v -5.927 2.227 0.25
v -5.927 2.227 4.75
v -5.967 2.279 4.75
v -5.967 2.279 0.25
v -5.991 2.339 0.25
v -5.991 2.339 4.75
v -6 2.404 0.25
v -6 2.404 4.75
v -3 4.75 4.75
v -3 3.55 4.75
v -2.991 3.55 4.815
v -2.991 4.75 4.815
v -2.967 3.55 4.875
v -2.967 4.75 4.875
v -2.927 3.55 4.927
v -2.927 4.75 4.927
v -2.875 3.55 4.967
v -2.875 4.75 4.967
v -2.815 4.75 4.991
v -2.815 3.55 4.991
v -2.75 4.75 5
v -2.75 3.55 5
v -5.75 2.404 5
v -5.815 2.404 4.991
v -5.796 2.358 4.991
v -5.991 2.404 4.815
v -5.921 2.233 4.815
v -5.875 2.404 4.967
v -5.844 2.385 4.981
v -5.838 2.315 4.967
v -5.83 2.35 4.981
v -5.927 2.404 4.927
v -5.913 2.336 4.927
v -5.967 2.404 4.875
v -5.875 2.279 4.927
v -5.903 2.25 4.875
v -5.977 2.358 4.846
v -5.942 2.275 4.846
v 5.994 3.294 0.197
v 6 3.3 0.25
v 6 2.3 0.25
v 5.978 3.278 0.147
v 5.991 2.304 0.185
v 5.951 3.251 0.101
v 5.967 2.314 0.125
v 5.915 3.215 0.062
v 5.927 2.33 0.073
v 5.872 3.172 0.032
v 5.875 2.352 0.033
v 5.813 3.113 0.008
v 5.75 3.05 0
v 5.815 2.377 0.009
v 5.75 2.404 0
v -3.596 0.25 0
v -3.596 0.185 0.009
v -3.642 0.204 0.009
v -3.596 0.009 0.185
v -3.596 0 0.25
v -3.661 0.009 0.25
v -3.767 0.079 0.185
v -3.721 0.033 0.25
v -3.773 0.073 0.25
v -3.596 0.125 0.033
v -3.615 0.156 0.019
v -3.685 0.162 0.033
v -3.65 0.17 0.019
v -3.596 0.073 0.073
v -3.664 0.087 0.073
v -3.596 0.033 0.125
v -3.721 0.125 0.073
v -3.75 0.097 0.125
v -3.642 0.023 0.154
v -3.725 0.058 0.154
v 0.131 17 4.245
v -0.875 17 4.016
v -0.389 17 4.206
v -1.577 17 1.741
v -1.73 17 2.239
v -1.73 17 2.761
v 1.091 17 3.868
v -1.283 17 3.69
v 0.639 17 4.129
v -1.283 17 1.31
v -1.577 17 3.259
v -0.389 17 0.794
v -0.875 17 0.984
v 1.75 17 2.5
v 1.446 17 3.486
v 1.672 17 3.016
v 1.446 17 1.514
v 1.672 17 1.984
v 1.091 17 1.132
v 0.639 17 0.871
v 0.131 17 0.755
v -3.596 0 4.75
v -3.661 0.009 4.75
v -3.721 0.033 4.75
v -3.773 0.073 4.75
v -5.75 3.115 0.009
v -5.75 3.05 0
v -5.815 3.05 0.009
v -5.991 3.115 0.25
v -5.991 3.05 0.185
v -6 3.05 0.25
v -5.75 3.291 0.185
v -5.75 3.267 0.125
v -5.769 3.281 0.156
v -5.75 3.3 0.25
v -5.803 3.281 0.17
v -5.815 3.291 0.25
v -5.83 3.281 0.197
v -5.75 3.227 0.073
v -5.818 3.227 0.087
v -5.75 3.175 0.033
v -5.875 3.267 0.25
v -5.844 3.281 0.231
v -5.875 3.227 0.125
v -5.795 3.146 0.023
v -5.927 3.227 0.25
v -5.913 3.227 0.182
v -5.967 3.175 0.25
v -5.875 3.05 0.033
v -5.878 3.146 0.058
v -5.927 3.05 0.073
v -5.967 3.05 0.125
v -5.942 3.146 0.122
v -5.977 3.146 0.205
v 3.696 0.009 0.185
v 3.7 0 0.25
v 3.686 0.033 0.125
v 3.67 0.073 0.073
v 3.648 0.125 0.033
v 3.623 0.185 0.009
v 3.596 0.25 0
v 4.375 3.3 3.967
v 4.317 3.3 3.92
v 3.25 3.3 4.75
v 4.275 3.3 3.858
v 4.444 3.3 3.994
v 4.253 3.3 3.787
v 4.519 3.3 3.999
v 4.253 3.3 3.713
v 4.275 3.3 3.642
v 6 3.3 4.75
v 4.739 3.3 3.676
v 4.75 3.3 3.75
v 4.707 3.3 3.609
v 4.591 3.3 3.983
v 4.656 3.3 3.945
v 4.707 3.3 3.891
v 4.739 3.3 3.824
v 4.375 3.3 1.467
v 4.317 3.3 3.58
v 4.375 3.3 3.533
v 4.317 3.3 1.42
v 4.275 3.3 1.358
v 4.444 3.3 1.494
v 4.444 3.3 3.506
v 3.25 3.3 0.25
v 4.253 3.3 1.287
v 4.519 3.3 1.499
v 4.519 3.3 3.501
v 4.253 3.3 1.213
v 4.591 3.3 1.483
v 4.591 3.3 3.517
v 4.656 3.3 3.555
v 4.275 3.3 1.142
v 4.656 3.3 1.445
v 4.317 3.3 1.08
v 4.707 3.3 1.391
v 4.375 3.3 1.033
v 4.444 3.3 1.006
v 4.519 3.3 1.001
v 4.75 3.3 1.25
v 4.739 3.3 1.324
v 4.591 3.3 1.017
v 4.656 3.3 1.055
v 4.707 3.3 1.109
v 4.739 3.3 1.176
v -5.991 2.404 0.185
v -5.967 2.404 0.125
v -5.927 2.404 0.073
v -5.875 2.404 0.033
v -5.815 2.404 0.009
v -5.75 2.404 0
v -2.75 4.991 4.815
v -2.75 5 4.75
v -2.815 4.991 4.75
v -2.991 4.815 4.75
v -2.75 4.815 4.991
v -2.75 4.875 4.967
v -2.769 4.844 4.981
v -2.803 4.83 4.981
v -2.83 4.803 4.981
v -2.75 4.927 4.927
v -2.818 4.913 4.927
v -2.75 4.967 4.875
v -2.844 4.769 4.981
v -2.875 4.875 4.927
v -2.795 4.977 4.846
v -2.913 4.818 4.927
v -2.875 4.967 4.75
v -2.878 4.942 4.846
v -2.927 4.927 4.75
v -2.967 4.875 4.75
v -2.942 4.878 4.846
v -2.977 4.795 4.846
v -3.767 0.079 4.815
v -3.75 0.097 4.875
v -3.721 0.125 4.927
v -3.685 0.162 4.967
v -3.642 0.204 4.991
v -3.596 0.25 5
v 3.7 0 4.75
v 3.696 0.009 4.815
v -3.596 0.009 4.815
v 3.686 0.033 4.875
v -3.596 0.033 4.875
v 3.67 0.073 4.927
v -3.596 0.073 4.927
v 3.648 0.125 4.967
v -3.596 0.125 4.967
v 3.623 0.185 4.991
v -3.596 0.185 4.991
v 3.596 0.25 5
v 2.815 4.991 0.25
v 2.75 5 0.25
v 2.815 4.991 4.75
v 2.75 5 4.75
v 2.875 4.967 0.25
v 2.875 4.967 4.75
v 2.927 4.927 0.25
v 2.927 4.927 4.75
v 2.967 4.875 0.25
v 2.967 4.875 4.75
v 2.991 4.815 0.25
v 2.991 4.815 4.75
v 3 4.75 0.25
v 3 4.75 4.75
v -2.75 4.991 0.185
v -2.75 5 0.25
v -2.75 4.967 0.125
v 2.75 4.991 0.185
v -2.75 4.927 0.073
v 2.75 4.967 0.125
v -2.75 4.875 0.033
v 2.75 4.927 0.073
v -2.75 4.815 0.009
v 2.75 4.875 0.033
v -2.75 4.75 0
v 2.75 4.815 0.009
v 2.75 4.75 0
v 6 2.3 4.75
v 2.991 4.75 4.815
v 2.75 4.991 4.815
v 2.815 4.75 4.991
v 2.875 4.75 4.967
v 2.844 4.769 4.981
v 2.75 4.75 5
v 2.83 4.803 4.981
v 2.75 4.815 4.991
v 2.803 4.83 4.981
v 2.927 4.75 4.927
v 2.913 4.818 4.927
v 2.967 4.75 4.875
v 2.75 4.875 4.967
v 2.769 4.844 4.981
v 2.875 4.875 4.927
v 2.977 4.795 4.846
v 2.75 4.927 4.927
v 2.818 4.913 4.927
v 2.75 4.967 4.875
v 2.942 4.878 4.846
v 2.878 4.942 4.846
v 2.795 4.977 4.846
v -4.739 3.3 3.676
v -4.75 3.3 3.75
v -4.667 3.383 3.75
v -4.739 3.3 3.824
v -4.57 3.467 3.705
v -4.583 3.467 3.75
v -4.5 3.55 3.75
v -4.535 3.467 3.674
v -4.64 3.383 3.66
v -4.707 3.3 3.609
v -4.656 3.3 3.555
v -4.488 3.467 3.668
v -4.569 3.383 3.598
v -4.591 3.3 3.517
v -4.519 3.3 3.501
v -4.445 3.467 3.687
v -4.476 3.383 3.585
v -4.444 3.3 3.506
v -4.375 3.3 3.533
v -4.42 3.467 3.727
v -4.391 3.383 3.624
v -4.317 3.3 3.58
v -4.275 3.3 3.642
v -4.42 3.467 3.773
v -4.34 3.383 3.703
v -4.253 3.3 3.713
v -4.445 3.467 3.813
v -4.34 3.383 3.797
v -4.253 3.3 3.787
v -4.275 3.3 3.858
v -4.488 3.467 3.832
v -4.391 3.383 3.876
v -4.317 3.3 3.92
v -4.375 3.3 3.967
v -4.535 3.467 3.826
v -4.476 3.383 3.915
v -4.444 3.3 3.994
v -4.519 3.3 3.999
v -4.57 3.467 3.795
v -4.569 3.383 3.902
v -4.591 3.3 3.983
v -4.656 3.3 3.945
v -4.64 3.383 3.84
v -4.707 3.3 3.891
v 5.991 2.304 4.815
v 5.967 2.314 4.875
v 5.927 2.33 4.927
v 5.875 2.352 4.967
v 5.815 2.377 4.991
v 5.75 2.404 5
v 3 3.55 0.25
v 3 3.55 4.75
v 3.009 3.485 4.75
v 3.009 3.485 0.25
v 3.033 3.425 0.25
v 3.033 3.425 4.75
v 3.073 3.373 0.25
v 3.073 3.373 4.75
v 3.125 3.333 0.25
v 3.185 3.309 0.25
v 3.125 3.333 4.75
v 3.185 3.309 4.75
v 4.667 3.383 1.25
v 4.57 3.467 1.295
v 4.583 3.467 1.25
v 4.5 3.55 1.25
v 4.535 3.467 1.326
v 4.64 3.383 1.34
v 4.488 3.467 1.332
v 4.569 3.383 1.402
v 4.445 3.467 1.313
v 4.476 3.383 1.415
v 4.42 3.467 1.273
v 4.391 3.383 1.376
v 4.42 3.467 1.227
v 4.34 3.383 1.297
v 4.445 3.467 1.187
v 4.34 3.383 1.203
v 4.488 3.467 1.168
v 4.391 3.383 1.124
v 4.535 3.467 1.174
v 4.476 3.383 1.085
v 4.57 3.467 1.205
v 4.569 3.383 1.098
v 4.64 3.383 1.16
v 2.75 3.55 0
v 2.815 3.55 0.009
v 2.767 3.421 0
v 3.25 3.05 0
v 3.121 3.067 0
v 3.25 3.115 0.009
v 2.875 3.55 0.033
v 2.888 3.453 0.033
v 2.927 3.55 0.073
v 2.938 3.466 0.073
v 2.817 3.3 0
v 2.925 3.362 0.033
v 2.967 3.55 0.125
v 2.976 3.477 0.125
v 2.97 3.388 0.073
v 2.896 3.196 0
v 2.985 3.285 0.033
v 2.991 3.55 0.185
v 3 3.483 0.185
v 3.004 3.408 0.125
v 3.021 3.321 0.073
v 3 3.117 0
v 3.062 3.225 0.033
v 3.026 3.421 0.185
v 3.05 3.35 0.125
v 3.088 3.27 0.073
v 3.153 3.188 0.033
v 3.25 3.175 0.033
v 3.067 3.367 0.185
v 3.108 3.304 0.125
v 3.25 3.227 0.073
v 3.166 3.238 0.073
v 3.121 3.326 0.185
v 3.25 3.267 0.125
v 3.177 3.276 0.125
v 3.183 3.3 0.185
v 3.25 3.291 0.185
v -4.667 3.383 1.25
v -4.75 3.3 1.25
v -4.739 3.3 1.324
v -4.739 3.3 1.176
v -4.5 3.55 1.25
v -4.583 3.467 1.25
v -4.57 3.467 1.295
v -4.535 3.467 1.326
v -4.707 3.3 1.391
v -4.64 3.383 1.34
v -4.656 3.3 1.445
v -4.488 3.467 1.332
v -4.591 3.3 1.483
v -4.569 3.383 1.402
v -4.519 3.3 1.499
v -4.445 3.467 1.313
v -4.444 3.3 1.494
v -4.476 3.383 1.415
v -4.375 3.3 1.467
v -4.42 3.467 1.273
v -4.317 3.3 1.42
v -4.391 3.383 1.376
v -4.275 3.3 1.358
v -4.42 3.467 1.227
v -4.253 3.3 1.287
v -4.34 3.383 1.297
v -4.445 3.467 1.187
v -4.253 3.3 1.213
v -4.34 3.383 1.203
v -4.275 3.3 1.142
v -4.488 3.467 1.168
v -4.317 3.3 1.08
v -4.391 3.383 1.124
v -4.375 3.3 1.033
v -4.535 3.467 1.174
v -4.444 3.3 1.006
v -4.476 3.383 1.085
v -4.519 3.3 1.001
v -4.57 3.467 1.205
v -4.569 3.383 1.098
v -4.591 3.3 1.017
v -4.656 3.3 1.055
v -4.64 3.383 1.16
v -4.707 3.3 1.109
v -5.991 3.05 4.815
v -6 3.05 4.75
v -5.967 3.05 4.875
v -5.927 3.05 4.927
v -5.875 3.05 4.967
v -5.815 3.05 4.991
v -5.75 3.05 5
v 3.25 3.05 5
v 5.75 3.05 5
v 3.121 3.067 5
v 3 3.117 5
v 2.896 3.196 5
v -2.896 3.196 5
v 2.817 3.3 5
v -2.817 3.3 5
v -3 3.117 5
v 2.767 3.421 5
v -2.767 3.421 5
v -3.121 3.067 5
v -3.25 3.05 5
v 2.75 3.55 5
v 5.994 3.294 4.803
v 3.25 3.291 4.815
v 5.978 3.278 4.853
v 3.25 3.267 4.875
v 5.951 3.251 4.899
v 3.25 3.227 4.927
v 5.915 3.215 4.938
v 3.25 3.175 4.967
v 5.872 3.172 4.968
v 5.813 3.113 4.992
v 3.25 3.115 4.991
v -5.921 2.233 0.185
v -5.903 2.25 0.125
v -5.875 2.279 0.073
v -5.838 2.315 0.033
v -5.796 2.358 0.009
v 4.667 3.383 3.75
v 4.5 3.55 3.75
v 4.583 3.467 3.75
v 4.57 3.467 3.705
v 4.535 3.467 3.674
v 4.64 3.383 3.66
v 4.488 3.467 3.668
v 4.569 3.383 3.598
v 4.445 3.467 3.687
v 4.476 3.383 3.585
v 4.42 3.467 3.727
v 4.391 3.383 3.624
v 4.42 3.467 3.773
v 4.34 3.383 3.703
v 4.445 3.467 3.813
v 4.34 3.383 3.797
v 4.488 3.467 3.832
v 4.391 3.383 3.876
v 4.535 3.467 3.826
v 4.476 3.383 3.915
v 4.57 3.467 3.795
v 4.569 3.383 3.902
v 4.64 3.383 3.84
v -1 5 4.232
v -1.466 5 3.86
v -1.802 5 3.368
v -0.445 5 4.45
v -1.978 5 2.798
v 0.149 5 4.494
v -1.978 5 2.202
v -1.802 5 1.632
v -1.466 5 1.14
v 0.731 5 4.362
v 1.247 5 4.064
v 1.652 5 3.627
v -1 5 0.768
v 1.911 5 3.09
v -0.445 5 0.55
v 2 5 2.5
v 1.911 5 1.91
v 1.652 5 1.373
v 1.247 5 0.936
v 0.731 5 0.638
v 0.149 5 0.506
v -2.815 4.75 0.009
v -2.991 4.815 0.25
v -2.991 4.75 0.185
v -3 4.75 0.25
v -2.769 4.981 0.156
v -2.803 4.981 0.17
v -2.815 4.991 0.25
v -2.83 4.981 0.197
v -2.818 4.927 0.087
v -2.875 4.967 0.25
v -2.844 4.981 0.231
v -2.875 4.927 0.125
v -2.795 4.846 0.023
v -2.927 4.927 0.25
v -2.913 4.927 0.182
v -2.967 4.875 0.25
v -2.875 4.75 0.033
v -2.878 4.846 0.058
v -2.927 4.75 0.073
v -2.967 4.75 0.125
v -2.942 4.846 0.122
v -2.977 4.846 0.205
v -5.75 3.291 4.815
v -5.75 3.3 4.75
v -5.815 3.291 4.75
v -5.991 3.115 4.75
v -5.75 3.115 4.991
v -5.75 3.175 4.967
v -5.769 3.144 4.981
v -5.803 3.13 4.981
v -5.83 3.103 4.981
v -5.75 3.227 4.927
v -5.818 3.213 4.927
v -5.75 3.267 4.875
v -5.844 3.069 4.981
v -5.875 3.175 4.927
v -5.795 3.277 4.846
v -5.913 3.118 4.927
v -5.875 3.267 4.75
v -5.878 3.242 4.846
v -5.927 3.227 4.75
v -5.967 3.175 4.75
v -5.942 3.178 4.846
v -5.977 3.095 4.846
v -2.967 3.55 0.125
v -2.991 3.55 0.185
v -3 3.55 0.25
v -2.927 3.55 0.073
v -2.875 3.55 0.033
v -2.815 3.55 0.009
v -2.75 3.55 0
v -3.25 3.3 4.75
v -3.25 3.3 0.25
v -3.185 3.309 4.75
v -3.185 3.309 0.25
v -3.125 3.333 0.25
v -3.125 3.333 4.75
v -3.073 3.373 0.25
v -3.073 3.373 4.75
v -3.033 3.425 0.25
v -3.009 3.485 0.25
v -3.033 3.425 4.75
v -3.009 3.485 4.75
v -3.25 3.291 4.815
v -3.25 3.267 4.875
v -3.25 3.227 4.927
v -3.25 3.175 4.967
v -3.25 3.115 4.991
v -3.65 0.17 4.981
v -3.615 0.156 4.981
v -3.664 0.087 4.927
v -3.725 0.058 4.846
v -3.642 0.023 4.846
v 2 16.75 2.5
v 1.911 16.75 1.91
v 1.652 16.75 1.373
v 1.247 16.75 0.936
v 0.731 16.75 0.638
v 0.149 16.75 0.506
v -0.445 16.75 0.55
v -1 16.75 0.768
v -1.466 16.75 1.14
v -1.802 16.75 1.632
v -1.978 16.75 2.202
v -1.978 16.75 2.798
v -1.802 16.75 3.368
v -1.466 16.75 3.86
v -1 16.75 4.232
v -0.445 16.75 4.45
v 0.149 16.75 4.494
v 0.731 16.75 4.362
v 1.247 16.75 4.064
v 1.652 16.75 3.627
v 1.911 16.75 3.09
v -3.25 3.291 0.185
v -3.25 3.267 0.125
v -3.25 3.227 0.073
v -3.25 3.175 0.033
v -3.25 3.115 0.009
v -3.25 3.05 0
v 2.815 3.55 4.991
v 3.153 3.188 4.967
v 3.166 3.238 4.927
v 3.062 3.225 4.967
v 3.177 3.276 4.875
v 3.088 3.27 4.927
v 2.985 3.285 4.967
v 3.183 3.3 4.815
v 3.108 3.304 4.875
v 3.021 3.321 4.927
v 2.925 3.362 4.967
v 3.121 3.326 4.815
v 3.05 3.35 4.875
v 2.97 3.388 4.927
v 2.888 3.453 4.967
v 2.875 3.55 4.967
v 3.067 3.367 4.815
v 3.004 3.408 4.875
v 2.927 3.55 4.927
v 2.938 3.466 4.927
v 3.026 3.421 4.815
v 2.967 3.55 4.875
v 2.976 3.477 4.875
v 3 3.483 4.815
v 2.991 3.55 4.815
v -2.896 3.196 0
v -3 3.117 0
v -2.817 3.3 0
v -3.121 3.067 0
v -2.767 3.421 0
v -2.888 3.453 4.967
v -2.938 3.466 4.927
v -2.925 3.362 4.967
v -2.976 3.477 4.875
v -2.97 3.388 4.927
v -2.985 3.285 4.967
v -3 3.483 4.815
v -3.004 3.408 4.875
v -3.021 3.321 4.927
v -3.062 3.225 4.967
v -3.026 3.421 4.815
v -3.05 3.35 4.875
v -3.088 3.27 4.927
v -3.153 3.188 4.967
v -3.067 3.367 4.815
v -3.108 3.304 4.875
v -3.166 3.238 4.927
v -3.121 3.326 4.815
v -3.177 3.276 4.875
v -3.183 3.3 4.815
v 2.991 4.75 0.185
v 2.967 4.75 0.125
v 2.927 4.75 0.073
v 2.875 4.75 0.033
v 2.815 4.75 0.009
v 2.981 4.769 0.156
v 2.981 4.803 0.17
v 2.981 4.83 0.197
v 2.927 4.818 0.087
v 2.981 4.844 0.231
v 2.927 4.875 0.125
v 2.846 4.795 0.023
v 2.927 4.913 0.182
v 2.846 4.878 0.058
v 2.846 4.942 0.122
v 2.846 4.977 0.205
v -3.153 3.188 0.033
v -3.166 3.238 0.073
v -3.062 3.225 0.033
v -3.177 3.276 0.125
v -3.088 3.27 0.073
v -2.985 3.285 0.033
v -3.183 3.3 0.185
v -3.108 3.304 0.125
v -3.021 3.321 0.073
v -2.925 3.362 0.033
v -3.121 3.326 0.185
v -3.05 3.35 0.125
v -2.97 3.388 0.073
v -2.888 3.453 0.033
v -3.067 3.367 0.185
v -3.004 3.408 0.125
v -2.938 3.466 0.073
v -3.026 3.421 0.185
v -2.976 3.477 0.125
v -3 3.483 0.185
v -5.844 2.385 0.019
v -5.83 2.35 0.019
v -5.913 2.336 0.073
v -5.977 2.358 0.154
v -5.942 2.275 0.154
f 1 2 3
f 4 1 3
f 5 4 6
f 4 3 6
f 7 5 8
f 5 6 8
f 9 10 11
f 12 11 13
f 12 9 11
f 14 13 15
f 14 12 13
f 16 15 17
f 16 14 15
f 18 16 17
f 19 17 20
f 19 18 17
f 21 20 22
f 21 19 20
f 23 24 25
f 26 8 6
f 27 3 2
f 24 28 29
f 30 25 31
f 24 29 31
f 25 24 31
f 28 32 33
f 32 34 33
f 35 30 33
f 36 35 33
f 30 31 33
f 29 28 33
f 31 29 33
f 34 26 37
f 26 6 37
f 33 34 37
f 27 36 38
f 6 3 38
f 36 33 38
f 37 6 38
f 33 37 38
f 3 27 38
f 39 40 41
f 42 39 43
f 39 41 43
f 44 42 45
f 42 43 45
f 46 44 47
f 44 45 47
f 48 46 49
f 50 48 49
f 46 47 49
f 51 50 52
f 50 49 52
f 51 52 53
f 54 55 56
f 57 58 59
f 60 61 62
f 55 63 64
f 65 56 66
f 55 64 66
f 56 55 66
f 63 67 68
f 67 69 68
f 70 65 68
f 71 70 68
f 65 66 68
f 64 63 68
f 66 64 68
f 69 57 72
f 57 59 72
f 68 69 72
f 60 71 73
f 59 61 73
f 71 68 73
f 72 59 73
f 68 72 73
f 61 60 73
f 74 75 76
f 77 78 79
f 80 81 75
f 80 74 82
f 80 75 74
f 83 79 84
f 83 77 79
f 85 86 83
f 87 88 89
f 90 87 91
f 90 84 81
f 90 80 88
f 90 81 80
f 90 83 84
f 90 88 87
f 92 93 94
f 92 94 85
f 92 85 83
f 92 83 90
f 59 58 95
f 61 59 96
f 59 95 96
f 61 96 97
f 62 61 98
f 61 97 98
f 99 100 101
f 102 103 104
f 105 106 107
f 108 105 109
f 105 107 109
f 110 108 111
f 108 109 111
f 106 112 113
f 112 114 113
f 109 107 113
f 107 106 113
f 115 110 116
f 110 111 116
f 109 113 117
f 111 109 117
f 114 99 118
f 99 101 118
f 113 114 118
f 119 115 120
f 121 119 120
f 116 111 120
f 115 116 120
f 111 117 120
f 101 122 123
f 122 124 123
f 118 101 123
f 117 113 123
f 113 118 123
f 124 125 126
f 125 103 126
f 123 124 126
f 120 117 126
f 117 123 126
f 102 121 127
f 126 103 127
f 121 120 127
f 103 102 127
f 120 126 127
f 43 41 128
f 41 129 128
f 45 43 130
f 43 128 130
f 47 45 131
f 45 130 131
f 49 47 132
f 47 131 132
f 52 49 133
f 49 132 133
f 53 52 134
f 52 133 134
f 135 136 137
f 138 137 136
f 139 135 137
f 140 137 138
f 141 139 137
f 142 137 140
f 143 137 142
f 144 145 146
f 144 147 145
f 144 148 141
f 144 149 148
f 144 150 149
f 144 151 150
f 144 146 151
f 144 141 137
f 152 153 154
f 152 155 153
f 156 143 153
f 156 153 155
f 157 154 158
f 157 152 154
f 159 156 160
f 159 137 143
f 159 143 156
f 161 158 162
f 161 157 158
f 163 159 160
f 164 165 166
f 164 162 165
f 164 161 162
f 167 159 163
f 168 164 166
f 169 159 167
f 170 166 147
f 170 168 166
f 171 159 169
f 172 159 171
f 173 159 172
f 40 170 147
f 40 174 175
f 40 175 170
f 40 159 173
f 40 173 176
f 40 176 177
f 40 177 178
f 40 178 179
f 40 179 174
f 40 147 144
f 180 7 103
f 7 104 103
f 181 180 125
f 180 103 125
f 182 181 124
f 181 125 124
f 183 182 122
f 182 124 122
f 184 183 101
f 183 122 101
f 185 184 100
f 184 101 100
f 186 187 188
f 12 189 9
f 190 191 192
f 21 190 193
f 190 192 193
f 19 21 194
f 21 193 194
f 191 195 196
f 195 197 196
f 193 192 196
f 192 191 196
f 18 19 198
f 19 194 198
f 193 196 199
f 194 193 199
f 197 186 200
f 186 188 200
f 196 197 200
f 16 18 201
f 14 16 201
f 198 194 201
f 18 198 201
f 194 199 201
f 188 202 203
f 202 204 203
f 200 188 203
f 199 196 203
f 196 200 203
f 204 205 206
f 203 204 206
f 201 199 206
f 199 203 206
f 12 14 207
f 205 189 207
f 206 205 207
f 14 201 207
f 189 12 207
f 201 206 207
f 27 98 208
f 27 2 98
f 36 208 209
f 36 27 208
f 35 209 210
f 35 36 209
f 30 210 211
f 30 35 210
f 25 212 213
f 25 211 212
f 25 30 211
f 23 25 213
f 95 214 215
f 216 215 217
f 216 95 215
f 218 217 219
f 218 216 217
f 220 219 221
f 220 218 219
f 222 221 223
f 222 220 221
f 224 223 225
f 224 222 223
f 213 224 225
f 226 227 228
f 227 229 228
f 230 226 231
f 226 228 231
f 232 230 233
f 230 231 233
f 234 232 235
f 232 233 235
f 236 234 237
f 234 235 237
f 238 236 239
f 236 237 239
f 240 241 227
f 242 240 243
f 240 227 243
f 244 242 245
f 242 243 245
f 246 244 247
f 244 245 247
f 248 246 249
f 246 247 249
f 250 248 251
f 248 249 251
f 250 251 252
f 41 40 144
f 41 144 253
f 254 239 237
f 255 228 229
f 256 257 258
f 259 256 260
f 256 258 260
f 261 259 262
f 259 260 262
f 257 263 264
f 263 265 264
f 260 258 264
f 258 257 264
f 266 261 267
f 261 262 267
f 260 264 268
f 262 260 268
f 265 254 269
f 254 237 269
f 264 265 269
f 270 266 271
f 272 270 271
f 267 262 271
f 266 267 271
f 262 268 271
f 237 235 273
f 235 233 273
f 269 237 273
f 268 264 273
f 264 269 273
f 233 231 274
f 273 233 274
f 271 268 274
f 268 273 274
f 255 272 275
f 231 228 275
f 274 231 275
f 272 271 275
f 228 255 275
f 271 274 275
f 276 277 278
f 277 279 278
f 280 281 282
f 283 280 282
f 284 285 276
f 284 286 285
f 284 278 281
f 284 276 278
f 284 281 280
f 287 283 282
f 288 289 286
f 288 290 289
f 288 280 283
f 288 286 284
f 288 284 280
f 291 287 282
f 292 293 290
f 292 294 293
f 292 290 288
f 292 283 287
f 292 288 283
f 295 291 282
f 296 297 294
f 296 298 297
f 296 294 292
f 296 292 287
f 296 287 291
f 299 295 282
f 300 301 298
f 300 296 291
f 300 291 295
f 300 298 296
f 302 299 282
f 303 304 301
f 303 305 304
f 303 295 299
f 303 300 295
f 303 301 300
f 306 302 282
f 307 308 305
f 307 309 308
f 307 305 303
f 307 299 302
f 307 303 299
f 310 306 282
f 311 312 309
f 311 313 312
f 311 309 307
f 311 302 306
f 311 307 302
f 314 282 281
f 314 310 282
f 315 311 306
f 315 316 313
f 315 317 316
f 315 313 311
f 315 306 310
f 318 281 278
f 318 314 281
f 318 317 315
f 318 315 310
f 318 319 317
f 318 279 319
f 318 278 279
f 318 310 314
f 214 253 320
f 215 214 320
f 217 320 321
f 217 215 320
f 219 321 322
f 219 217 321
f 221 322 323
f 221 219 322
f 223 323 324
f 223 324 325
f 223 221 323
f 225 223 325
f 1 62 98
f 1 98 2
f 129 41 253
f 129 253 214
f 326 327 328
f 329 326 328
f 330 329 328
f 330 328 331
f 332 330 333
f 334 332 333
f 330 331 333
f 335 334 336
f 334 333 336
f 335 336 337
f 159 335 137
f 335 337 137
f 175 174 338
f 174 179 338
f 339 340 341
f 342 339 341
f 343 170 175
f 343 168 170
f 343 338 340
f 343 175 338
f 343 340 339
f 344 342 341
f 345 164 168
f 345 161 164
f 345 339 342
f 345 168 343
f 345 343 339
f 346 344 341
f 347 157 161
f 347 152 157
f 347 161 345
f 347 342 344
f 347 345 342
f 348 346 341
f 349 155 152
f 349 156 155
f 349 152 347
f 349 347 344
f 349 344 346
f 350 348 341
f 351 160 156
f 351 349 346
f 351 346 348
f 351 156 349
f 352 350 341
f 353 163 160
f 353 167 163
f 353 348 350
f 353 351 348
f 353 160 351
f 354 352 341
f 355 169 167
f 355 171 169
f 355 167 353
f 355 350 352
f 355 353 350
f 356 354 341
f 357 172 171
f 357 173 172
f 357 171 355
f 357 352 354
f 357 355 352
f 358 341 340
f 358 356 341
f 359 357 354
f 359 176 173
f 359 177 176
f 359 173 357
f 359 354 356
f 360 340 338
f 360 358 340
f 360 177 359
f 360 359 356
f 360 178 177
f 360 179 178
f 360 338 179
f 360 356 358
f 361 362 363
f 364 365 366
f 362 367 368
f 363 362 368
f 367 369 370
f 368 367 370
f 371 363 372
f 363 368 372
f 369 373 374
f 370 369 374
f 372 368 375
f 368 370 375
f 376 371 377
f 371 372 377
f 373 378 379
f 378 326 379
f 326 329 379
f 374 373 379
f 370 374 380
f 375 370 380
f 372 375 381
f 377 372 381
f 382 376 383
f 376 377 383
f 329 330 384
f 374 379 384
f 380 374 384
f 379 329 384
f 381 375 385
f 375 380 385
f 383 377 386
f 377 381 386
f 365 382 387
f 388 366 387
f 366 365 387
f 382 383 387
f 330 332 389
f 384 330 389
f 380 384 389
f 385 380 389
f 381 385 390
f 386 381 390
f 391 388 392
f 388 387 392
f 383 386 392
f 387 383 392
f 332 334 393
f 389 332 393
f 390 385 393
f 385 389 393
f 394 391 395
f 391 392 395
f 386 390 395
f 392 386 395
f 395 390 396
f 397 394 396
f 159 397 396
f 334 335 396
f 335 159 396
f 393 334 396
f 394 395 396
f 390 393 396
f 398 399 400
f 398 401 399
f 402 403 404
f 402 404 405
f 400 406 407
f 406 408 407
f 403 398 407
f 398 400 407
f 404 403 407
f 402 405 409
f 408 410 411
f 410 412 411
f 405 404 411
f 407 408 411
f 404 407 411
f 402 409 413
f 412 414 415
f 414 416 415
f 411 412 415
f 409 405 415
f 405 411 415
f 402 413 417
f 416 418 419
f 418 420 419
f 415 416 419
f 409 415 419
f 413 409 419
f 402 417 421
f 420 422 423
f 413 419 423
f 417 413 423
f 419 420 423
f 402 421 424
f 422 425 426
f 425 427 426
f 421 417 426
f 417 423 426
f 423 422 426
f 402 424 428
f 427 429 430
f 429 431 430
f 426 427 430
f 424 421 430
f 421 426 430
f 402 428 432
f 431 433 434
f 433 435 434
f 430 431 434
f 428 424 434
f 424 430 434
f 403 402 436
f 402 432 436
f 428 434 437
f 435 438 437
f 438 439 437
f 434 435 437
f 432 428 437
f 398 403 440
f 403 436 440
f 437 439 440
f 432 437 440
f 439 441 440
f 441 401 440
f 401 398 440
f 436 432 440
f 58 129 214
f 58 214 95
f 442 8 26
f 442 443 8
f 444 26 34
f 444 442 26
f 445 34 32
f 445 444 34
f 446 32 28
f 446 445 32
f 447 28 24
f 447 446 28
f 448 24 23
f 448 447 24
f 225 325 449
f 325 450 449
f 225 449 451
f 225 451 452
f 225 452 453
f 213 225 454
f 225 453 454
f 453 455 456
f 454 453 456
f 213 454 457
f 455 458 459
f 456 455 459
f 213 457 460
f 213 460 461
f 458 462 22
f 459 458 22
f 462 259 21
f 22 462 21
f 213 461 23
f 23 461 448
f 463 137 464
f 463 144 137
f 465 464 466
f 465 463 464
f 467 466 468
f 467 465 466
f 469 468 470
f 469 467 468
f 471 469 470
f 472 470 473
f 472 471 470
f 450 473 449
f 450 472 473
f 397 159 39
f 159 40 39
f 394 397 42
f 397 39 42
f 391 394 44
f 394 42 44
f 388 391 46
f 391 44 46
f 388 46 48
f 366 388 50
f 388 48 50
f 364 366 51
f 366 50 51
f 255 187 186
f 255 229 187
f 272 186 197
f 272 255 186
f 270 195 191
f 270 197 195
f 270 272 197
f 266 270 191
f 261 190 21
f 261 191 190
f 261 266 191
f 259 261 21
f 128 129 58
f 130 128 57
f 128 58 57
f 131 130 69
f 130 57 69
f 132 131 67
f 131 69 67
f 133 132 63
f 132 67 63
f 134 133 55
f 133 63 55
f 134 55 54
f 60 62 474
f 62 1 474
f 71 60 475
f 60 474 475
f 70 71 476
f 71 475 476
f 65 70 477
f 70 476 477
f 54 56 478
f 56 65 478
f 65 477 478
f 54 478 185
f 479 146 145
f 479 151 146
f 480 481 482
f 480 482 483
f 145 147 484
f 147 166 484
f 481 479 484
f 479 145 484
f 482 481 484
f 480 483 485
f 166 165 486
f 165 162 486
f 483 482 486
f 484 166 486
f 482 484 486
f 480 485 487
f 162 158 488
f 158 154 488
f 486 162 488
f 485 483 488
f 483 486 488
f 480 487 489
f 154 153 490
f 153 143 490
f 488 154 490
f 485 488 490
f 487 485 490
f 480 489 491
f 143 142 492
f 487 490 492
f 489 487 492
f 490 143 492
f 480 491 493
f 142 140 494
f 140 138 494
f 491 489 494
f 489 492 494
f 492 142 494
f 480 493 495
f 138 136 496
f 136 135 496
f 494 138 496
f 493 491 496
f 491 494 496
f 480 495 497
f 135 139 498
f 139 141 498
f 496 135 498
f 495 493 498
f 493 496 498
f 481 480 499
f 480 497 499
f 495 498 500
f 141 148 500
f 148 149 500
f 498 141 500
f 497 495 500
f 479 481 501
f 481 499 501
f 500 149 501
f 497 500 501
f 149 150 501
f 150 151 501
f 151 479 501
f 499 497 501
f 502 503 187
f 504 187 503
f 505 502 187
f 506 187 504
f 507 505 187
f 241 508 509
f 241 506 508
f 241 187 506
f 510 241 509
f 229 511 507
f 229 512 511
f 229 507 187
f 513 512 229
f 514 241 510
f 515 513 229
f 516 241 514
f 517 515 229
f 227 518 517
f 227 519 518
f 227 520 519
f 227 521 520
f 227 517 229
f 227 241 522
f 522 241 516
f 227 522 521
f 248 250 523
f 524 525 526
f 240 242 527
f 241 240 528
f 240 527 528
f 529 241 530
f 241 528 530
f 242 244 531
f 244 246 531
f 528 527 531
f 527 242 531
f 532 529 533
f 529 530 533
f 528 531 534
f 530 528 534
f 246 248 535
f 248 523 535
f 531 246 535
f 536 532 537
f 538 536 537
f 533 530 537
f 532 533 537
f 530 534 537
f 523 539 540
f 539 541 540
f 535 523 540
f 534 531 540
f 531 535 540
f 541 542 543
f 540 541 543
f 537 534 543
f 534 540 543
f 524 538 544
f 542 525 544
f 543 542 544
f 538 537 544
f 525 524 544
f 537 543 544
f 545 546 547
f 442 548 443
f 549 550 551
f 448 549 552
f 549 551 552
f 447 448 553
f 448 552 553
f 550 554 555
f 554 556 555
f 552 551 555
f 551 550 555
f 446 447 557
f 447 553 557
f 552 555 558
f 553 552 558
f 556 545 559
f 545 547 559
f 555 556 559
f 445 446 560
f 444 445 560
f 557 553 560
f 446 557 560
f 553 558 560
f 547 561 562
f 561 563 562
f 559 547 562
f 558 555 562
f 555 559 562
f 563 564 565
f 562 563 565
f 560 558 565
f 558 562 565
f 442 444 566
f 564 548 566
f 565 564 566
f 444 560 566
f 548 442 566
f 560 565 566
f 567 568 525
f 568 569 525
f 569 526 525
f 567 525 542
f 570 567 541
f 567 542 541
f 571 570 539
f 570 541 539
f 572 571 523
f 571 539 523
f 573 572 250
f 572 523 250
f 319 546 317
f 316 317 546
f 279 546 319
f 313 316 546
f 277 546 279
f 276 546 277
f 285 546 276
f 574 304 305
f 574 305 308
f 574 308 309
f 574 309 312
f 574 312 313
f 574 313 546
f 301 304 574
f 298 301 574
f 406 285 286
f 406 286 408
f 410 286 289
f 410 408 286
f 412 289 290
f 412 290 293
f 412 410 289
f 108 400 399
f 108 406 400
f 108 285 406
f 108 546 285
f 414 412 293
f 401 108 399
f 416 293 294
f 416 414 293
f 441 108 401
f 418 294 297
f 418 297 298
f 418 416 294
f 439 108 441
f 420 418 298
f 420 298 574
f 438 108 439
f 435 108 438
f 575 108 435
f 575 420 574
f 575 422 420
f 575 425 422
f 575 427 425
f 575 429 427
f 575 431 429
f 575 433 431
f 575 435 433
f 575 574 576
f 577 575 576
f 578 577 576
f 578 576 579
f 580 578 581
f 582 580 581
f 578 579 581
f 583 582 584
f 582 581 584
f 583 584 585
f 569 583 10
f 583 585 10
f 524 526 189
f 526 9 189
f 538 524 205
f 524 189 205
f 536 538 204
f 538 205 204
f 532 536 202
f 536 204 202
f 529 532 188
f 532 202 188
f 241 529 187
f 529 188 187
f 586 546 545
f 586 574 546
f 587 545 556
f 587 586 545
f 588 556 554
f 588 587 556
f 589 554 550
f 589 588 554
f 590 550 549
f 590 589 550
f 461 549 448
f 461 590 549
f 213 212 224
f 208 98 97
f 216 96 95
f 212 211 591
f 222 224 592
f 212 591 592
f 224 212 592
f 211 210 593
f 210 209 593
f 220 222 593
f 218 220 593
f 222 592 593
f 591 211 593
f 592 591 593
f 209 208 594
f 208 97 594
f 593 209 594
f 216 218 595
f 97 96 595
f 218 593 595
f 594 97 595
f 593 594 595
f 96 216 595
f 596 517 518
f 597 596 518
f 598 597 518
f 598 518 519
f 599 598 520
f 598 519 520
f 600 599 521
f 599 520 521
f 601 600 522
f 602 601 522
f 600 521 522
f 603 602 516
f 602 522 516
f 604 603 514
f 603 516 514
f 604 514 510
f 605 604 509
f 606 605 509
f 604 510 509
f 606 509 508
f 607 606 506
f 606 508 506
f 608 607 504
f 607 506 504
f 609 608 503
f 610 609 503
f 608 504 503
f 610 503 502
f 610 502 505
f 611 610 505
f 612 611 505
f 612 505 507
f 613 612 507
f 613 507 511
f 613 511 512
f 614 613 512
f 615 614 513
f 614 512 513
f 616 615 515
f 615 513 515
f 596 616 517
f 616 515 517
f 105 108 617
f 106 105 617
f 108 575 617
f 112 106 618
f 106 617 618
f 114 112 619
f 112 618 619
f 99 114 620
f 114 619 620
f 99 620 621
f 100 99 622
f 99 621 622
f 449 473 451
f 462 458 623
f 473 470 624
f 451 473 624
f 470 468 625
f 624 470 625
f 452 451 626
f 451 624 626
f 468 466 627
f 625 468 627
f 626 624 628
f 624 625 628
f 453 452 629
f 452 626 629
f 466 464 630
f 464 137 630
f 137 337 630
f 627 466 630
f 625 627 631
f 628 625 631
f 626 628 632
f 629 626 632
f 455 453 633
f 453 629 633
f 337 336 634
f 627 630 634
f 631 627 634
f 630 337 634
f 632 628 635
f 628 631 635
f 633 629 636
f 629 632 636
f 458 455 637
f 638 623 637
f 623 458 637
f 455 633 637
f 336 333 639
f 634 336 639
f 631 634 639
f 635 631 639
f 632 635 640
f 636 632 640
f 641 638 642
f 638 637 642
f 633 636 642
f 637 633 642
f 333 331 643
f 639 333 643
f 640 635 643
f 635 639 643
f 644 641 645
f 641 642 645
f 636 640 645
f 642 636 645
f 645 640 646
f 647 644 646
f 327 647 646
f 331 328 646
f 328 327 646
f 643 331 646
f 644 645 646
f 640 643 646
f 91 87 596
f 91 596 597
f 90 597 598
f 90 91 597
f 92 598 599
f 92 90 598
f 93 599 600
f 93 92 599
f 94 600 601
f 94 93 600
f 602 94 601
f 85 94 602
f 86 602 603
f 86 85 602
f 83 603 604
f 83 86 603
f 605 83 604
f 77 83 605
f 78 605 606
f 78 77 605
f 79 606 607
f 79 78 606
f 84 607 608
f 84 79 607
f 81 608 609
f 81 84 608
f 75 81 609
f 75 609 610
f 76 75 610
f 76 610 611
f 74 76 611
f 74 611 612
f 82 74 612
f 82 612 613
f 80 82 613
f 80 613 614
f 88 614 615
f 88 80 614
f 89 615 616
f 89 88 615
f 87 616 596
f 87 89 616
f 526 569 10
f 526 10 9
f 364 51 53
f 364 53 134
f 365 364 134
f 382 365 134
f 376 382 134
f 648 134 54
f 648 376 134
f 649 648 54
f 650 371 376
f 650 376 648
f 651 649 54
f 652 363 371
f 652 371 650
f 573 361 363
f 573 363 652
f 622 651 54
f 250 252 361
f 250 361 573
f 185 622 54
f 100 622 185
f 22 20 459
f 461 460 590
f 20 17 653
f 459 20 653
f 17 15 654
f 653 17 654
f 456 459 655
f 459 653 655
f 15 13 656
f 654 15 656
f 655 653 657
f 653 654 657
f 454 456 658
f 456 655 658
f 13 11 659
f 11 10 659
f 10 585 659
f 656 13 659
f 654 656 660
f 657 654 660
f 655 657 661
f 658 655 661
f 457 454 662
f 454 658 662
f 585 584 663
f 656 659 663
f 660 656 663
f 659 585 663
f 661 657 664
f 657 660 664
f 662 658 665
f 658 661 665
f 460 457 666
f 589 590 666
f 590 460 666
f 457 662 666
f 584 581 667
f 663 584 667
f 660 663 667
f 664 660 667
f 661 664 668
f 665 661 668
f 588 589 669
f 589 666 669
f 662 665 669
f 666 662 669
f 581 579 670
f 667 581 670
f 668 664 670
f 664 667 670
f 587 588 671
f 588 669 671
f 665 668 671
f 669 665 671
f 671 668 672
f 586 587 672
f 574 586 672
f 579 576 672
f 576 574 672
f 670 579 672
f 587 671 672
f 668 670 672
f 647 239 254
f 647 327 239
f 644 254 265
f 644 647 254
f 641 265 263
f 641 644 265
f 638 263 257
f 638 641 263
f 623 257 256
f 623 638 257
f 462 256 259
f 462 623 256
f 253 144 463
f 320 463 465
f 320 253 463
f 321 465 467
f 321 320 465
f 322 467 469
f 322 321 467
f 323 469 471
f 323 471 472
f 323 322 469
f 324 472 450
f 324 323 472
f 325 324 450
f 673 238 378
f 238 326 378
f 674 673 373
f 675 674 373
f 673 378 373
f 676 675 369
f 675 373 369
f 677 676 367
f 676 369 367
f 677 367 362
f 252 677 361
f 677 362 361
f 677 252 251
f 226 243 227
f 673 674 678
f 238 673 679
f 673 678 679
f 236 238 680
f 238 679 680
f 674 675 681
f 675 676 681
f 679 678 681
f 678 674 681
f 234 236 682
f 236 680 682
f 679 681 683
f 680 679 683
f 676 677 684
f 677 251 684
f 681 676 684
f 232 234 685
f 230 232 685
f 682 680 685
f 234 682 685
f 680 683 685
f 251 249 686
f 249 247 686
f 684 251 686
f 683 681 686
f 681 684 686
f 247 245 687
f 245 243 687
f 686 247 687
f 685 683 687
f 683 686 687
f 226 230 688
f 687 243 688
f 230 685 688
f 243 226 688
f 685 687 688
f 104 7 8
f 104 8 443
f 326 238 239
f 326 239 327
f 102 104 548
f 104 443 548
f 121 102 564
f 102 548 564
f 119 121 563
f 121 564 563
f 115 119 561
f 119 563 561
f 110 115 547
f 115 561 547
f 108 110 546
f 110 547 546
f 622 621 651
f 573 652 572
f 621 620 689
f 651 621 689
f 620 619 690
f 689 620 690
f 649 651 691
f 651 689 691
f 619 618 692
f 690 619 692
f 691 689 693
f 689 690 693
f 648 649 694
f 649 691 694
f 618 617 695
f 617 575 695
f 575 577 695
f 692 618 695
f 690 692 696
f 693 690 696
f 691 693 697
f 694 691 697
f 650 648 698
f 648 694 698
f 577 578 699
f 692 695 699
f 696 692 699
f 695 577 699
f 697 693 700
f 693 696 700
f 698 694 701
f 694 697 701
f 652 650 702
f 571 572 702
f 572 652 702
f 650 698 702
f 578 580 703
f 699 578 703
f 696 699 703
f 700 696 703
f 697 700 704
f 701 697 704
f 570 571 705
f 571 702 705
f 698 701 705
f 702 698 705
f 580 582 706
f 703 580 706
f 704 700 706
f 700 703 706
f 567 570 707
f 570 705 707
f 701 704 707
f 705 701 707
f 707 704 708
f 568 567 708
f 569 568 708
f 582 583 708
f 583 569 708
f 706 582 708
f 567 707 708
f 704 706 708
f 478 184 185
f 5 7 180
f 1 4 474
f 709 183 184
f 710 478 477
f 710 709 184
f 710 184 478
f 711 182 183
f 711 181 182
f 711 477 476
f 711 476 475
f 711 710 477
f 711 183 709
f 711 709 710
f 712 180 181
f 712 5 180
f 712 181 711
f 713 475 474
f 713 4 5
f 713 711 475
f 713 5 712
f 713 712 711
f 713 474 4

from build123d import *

# Parameters (mm, degrees)
ESTRUSIONE_ESTRUSIONE1_DEPTH = 5
RACCORDO1_R                  = 0.25
SCHIZZO7_R                   = 2
ESTRUSIONE_ESTRUSIONE3_DEPTH = 12
SMUSSO1_SIZE                 = 0.25


with BuildPart() as part:
    # Schizzo1 → Estrusione-Estrusione1 (new body)
    with BuildSketch(Plane.XY):
        Polygon((3.7, 0), (-3.7, 0), (-6, 2.3), (-6, 3.3), (-3, 3.3), (-3, 5), (3, 5), (3, 3.3), (6, 3.3), (6, 2.3), align=None)
    extrude(amount=ESTRUSIONE_ESTRUSIONE1_DEPTH)

    # Raccordo1
    raccordo1_edges = [part.edges().sort_by_distance(p)[0] for p in [
        (-6, 2.8, 0),
        (-4.5, 3.3, 0),
        (-3, 4.15, 0),
        (0, 5, 0),
        (3, 4.15, 0),
        (4.5, 3.3, 0),
        (6, 2.8, 0),
        (4.85, 1.15, 5),
        (4.85, 1.15, 0),
        (0, 0, 0),
        (-4.85, 1.15, 0),
        (6, 2.8, 5),
        (-6, 2.3, 2.5),
        (-6, 3.3, 2.5),
        (-3, 3.3, 2.5),
        (-3, 5, 2.5),
        (3, 5, 2.5),
        (3, 3.3, 2.5),
        (-3.7, 0, 2.5),
        (4.5, 3.3, 5),
        (3, 4.15, 5),
        (0, 5, 5),
        (-3, 4.15, 5),
        (-4.5, 3.3, 5),
        (-6, 2.8, 5),
        (-4.85, 1.15, 5),
        (0, 0, 5),
    ]]
    fillet(raccordo1_edges, radius=RACCORDO1_R)

    # Schizzo7 → Estrusione-Estrusione3 (add)
    with BuildSketch(Plane(origin=(0, 5, 0), x_dir=(1, 0, 0), z_dir=(0, 1, 0))):
        with Locations((0, -2.5)):
            Circle(SCHIZZO7_R)
    extrude(amount=ESTRUSIONE_ESTRUSIONE3_DEPTH)

    # Smusso1
    smusso1_edges = [part.edges().sort_by_distance(p)[0] for p in [
        (-2, 17, 2.5),
    ]]
    chamfer(smusso1_edges, length=SMUSSO1_SIZE)

    # Schizzo8 → Rivoluzione2 (revolve)
    with BuildSketch(Plane.XY.offset(1.25)):
        Polygon((-4.5, 3.3), (-4.5, 3.55), (-4.75, 3.3), align=None)
    rivoluzione2 = revolve(axis=Axis((-4.5, 3.3, 1.25), (0, 1, 0)))

    # Specchia3: Rivoluzione2 across plane
    add(rivoluzione2.mirror(Plane(origin=(0, 0, 0), x_dir=(0, 0, 1), z_dir=(1, 0, 0))))

    # Specchia4: Rivoluzione2 across plane
    add(rivoluzione2.mirror(Plane.XY.offset(2.5)))

    # Specchia4 copy 1 sketch → Specchia4 copy 1 (revolve)
    with BuildSketch(Plane(origin=(0, 0, 3.75), x_dir=(-1, 0, 0), z_dir=(0, 0, -1))):
        Polygon((-4.5, 3.3), (-4.5, 3.55), (-4.75, 3.3), align=None)
    revolve(axis=Axis((4.5, 3.3, 3.75), (0, 1, 0)))


solid = part.part
